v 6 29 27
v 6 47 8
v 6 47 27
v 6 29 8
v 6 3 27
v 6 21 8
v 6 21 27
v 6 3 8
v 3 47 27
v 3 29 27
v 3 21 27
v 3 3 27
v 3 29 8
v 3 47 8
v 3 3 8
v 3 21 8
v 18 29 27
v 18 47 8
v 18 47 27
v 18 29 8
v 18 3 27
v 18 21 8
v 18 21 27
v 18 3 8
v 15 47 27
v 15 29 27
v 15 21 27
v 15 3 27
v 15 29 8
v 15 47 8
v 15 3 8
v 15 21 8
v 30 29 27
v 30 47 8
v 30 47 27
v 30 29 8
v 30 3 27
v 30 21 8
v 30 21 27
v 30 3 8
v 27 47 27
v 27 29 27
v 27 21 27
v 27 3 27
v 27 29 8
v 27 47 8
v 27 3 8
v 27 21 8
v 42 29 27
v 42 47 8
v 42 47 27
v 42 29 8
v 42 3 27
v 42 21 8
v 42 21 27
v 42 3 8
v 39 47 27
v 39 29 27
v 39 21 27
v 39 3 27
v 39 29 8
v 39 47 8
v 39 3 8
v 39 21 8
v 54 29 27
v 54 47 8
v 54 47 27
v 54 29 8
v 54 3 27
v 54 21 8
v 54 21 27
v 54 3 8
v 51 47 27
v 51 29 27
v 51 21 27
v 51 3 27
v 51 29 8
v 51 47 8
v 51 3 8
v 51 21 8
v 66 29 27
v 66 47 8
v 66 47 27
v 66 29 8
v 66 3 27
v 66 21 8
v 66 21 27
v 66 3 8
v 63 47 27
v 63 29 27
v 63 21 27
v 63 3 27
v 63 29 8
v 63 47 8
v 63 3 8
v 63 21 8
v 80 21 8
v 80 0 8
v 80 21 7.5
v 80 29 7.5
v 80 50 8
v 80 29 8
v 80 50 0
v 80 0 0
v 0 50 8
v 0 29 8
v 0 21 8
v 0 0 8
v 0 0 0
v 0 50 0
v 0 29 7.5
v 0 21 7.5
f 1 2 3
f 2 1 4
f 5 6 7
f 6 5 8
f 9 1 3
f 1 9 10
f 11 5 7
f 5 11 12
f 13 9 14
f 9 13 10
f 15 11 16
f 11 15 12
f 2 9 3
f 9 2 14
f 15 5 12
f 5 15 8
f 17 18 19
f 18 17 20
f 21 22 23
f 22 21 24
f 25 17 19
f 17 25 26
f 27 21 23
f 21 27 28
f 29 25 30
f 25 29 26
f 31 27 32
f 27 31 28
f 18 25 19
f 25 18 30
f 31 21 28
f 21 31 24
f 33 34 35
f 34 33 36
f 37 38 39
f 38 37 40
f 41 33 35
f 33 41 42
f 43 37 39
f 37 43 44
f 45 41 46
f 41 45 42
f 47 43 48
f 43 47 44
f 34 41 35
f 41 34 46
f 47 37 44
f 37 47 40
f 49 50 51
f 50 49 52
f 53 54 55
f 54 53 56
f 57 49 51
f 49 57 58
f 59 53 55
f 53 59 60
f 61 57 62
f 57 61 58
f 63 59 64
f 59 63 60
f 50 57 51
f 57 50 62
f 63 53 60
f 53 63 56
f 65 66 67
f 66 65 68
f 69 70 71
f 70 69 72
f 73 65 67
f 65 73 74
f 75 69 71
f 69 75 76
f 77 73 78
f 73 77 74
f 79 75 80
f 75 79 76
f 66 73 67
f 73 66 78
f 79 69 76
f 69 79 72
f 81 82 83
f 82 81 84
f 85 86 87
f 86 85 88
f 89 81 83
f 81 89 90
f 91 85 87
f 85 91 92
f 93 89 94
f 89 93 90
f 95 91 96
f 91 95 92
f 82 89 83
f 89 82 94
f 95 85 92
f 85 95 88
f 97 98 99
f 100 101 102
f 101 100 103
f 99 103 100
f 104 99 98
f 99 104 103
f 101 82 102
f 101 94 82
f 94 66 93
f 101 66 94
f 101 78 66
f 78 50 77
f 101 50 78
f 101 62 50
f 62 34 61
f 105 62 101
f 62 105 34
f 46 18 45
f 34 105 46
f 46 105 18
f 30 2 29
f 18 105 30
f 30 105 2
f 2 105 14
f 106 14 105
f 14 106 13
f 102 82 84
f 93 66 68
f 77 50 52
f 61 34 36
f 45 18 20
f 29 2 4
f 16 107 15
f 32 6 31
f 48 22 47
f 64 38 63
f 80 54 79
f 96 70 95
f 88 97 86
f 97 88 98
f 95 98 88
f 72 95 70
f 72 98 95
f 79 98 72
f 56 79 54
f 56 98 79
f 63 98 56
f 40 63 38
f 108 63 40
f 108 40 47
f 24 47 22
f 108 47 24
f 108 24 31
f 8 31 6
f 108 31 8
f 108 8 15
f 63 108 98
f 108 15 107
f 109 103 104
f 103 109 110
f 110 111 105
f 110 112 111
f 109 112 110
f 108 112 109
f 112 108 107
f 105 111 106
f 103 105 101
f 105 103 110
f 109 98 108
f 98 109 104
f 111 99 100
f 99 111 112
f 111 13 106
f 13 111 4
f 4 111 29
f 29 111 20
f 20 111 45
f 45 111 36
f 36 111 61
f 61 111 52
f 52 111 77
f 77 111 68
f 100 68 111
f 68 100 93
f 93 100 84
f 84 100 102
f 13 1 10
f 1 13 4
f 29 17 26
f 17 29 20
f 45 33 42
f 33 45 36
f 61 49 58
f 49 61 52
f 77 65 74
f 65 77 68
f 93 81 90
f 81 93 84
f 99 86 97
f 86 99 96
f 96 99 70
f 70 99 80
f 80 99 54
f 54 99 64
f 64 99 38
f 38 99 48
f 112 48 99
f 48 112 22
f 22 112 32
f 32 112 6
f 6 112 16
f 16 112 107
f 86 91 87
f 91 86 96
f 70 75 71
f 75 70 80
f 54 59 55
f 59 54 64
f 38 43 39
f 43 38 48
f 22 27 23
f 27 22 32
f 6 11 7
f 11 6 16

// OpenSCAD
$fn = 32;

// ----------------------------------------------------------------------
// Heatsink: slotted fin block
// ----------------------------------------------------------------------

// --- parameters (mm) ---
base_l = 80;              // base length, X
base_w = 50;              // base width, Y
base_t = 8;               // base plate thickness
fin_h = 20;               // fin height above the base
fin_t = 3;                // fin thickness
edge = 3;                 // margin from the base ends
pitch = 12;               // fin pitch
slot_w = 8;               // central slot width, Y

n_fins = floor((base_l - 2 * edge - fin_t) / pitch) + 1;  // fin count
total_h = base_t + fin_h - 1;  // overall height

difference() {
union() {
  cube([base_l, base_w, base_t]);
  for (i = [0 : n_fins - 1])
    translate([edge + i * pitch, edge, base_t - 1])
      cube([fin_t, base_w - 2 * edge, fin_h]);
}
  translate([-1, base_w / 2 - slot_w / 2, base_t - 0.5])
    cube([base_l + 2, slot_w, fin_h + 2]);
}
